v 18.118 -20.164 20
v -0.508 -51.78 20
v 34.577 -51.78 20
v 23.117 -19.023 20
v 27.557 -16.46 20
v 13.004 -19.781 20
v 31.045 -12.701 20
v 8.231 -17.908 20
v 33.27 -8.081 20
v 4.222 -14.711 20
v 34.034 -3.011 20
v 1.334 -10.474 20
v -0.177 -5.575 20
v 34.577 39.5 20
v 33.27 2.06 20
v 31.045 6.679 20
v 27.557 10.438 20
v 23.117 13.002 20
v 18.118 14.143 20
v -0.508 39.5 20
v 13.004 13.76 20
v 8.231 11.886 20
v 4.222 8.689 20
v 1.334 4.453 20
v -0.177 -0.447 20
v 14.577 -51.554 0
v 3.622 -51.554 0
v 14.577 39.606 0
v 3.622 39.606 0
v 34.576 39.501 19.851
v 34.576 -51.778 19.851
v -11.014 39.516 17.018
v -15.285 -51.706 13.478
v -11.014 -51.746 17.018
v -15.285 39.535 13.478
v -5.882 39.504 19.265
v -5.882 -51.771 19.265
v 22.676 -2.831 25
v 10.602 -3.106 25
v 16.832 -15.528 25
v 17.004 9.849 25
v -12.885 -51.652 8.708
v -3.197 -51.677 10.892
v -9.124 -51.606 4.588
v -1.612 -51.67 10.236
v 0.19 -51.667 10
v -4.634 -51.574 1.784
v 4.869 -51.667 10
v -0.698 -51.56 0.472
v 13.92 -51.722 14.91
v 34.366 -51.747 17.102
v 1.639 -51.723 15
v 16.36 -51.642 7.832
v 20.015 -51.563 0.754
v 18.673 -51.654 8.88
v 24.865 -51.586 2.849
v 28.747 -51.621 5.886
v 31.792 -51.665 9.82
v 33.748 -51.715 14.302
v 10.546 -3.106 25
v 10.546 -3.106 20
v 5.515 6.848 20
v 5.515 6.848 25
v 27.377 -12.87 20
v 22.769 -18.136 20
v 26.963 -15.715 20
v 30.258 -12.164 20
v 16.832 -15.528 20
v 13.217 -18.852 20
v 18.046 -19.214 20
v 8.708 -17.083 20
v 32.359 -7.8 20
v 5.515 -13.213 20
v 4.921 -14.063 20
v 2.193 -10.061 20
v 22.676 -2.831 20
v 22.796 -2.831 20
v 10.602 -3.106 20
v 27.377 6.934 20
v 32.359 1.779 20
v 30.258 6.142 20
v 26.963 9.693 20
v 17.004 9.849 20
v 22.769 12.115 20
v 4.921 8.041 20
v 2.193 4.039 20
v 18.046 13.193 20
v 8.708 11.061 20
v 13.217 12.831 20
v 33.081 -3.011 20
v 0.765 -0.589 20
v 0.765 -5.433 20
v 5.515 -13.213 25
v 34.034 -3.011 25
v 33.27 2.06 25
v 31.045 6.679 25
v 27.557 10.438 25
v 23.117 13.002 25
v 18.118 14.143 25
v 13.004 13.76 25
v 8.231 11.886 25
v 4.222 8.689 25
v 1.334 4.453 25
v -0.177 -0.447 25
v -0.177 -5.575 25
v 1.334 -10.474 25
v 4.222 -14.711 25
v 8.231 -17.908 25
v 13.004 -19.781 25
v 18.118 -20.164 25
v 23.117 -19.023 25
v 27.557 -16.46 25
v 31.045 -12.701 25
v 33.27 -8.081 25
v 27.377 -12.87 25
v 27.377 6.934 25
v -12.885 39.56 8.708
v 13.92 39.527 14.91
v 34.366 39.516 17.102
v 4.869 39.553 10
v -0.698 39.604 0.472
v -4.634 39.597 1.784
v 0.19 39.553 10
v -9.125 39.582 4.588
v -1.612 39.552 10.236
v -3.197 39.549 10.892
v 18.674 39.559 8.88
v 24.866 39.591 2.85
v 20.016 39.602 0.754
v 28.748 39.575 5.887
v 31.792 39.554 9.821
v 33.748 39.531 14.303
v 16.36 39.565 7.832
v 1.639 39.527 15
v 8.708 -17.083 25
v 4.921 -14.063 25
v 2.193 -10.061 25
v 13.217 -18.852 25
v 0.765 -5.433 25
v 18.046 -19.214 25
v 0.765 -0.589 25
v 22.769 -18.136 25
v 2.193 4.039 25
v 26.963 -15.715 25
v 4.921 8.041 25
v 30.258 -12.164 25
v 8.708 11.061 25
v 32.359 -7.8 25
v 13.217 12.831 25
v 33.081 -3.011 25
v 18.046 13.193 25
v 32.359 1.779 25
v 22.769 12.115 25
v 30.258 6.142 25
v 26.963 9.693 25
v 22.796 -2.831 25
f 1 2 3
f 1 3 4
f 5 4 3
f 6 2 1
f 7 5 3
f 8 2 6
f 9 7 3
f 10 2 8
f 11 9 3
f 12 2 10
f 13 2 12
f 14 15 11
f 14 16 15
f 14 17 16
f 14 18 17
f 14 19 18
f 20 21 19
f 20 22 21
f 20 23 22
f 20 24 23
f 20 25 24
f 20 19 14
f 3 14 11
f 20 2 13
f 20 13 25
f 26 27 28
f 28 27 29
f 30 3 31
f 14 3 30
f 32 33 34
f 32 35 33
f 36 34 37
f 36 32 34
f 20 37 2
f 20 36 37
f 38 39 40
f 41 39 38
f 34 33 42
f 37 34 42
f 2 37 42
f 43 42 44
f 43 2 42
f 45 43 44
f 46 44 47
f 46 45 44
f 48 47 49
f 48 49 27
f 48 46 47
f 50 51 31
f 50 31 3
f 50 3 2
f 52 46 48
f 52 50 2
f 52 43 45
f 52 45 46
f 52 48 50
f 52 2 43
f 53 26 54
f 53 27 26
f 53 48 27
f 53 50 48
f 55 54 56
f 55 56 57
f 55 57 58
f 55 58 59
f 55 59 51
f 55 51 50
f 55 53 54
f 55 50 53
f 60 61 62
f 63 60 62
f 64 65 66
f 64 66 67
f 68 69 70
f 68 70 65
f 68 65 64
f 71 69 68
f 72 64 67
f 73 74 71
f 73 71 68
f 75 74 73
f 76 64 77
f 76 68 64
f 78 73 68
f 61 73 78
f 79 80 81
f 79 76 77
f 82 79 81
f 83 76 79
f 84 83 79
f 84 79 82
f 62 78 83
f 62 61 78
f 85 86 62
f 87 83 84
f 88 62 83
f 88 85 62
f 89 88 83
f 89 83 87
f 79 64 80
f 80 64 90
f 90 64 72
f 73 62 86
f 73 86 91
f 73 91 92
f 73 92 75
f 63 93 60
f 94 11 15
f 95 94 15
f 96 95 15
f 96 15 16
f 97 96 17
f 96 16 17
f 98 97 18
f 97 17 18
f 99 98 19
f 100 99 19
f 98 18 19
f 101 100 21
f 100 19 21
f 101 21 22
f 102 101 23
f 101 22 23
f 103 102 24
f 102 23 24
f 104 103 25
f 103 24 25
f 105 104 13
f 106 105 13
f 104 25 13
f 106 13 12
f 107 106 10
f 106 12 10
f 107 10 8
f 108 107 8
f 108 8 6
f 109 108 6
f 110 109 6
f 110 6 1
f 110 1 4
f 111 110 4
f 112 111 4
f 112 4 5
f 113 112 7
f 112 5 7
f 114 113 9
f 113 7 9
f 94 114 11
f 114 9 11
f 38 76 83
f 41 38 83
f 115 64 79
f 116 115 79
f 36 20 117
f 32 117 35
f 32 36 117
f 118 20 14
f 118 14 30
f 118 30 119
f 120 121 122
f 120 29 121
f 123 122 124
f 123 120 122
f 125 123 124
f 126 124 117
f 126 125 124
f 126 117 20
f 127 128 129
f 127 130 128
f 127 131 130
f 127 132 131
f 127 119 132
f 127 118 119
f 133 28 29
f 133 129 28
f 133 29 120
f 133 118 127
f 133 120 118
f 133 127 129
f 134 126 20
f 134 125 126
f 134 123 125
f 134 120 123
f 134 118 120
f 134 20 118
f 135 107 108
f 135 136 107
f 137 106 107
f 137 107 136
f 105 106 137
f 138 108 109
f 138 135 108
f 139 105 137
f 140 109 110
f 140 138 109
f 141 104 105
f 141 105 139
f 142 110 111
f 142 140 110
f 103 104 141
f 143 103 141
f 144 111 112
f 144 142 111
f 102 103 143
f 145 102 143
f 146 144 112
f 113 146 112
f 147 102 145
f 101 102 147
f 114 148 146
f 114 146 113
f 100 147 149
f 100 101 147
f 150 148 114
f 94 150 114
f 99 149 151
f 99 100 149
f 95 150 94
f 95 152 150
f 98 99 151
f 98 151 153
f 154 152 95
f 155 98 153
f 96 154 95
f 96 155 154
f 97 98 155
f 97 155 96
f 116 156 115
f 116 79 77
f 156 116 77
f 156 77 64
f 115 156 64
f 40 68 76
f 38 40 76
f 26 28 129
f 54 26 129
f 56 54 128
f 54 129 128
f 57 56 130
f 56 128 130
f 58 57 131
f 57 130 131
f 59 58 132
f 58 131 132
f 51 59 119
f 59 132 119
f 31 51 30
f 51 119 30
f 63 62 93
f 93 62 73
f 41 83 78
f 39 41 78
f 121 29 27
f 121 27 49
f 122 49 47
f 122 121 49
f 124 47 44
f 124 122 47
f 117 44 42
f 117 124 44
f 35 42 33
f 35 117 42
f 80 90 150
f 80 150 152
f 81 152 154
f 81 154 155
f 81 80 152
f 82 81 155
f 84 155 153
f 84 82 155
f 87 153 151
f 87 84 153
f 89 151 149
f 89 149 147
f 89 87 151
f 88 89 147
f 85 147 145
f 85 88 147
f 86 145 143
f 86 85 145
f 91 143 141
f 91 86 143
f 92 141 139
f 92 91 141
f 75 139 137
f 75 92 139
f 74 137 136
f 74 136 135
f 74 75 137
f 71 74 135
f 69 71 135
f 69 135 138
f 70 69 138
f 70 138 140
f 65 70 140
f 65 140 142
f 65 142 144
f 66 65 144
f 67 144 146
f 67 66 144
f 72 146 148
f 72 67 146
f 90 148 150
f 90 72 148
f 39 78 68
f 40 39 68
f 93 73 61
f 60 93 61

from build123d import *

# Parameters (mm, degrees)
F0_W        = 62.0055571198
F0_H        = 91.1606
F2_W        = 43.9132880419
F2_H        = 91.28
F4_R        = 20
F5_R        = 20
F6_T1_DEPTH = 247.1570875446
F8_R        = 17.2017157063
F8_R_2      = 16.2487468326
F9_DEPTH    = 5
F10_DEPTH   = 5


# Not quite as in the source:
# - a fillet or chamfer that OpenCascade refuses, or shapes differently, is made with other operations: its cross-section is extruded or revolved along the edge and cut away or added


with BuildPart() as f3:
    # F0 (on Top) → F3 section 0
    with BuildSketch(Plane.XY):
        with Locations((3.4252367914, -5.9738955829)):
            Rectangle(F0_W, F0_H)
    # F2 (on offset) → F3 section 1
    with BuildSketch(Plane.XY.offset(20)):
        with Locations((12.6207480207, -6.1396389759)):
            Rectangle(F2_W, F2_H)
    loft()

    # F4
    f4_edges = [f3.edges().sort_by_distance(p)[0] for p in [
        (-9.335896, -6.139639, 20),
    ]]
    fillet(f4_edges, radius=F4_R)

    # F5
    f5_edges = [f3.edges().sort_by_distance(p)[0] for p in [
        (34.428015, -5.973896, 0),
    ]]
    fillet(f5_edges, radius=F5_R)

    # F6: fillet of radius 20 on 1 edges, made by hand

    # F6_s2 → F6_t1 (cut)
    with BuildSketch(Plane.XZ.offset(-117.6046481894)):
        with BuildLine():
            ThreePointArc((3.6217557404, 0), (-7.9875678865, 3.7143128813), (-15.2848254843, 13.4776395073))
            Line((-15.2848254843, 13.4776395073), (-27.5775417686, 0))
            Line((-27.5775417686, 0), (3.6217557404, 0))
        make_face()
    extrude(amount=F6_T1_DEPTH, mode=Mode.SUBTRACT)

    # F8 (on offset) → F9 (join)
    with BuildSketch(Plane.XY.offset(20)):
        with Locations((16.8321914971, -3.0107519124)):
            Circle(F8_R)
        with Locations((16.8321914971, -3.0107519124)):
            Circle(F8_R_2, mode=Mode.SUBTRACT)
        Polygon((5.5154971778, 6.8484889343), (5.5154971778, -13.2129238918), (10.5462484062, -3.106220687), align=None)
        Polygon((27.3772925138, -12.8699932247), (27.3772925138, 6.9342213683), (22.7957628667, -2.8306879103), align=None)
    extrude(amount=F9_DEPTH)

    # F8 (on offset) → F10 (join)
    with BuildSketch(Plane.XY.offset(20)):
        Polygon((17.0036572963, 9.8491283134), (10.6022227556, -3.106220687), (16.8321914971, -15.5277010053), (22.6763673127, -2.8306879103), align=None)
    extrude(amount=F10_DEPTH)


solid = f3.part
